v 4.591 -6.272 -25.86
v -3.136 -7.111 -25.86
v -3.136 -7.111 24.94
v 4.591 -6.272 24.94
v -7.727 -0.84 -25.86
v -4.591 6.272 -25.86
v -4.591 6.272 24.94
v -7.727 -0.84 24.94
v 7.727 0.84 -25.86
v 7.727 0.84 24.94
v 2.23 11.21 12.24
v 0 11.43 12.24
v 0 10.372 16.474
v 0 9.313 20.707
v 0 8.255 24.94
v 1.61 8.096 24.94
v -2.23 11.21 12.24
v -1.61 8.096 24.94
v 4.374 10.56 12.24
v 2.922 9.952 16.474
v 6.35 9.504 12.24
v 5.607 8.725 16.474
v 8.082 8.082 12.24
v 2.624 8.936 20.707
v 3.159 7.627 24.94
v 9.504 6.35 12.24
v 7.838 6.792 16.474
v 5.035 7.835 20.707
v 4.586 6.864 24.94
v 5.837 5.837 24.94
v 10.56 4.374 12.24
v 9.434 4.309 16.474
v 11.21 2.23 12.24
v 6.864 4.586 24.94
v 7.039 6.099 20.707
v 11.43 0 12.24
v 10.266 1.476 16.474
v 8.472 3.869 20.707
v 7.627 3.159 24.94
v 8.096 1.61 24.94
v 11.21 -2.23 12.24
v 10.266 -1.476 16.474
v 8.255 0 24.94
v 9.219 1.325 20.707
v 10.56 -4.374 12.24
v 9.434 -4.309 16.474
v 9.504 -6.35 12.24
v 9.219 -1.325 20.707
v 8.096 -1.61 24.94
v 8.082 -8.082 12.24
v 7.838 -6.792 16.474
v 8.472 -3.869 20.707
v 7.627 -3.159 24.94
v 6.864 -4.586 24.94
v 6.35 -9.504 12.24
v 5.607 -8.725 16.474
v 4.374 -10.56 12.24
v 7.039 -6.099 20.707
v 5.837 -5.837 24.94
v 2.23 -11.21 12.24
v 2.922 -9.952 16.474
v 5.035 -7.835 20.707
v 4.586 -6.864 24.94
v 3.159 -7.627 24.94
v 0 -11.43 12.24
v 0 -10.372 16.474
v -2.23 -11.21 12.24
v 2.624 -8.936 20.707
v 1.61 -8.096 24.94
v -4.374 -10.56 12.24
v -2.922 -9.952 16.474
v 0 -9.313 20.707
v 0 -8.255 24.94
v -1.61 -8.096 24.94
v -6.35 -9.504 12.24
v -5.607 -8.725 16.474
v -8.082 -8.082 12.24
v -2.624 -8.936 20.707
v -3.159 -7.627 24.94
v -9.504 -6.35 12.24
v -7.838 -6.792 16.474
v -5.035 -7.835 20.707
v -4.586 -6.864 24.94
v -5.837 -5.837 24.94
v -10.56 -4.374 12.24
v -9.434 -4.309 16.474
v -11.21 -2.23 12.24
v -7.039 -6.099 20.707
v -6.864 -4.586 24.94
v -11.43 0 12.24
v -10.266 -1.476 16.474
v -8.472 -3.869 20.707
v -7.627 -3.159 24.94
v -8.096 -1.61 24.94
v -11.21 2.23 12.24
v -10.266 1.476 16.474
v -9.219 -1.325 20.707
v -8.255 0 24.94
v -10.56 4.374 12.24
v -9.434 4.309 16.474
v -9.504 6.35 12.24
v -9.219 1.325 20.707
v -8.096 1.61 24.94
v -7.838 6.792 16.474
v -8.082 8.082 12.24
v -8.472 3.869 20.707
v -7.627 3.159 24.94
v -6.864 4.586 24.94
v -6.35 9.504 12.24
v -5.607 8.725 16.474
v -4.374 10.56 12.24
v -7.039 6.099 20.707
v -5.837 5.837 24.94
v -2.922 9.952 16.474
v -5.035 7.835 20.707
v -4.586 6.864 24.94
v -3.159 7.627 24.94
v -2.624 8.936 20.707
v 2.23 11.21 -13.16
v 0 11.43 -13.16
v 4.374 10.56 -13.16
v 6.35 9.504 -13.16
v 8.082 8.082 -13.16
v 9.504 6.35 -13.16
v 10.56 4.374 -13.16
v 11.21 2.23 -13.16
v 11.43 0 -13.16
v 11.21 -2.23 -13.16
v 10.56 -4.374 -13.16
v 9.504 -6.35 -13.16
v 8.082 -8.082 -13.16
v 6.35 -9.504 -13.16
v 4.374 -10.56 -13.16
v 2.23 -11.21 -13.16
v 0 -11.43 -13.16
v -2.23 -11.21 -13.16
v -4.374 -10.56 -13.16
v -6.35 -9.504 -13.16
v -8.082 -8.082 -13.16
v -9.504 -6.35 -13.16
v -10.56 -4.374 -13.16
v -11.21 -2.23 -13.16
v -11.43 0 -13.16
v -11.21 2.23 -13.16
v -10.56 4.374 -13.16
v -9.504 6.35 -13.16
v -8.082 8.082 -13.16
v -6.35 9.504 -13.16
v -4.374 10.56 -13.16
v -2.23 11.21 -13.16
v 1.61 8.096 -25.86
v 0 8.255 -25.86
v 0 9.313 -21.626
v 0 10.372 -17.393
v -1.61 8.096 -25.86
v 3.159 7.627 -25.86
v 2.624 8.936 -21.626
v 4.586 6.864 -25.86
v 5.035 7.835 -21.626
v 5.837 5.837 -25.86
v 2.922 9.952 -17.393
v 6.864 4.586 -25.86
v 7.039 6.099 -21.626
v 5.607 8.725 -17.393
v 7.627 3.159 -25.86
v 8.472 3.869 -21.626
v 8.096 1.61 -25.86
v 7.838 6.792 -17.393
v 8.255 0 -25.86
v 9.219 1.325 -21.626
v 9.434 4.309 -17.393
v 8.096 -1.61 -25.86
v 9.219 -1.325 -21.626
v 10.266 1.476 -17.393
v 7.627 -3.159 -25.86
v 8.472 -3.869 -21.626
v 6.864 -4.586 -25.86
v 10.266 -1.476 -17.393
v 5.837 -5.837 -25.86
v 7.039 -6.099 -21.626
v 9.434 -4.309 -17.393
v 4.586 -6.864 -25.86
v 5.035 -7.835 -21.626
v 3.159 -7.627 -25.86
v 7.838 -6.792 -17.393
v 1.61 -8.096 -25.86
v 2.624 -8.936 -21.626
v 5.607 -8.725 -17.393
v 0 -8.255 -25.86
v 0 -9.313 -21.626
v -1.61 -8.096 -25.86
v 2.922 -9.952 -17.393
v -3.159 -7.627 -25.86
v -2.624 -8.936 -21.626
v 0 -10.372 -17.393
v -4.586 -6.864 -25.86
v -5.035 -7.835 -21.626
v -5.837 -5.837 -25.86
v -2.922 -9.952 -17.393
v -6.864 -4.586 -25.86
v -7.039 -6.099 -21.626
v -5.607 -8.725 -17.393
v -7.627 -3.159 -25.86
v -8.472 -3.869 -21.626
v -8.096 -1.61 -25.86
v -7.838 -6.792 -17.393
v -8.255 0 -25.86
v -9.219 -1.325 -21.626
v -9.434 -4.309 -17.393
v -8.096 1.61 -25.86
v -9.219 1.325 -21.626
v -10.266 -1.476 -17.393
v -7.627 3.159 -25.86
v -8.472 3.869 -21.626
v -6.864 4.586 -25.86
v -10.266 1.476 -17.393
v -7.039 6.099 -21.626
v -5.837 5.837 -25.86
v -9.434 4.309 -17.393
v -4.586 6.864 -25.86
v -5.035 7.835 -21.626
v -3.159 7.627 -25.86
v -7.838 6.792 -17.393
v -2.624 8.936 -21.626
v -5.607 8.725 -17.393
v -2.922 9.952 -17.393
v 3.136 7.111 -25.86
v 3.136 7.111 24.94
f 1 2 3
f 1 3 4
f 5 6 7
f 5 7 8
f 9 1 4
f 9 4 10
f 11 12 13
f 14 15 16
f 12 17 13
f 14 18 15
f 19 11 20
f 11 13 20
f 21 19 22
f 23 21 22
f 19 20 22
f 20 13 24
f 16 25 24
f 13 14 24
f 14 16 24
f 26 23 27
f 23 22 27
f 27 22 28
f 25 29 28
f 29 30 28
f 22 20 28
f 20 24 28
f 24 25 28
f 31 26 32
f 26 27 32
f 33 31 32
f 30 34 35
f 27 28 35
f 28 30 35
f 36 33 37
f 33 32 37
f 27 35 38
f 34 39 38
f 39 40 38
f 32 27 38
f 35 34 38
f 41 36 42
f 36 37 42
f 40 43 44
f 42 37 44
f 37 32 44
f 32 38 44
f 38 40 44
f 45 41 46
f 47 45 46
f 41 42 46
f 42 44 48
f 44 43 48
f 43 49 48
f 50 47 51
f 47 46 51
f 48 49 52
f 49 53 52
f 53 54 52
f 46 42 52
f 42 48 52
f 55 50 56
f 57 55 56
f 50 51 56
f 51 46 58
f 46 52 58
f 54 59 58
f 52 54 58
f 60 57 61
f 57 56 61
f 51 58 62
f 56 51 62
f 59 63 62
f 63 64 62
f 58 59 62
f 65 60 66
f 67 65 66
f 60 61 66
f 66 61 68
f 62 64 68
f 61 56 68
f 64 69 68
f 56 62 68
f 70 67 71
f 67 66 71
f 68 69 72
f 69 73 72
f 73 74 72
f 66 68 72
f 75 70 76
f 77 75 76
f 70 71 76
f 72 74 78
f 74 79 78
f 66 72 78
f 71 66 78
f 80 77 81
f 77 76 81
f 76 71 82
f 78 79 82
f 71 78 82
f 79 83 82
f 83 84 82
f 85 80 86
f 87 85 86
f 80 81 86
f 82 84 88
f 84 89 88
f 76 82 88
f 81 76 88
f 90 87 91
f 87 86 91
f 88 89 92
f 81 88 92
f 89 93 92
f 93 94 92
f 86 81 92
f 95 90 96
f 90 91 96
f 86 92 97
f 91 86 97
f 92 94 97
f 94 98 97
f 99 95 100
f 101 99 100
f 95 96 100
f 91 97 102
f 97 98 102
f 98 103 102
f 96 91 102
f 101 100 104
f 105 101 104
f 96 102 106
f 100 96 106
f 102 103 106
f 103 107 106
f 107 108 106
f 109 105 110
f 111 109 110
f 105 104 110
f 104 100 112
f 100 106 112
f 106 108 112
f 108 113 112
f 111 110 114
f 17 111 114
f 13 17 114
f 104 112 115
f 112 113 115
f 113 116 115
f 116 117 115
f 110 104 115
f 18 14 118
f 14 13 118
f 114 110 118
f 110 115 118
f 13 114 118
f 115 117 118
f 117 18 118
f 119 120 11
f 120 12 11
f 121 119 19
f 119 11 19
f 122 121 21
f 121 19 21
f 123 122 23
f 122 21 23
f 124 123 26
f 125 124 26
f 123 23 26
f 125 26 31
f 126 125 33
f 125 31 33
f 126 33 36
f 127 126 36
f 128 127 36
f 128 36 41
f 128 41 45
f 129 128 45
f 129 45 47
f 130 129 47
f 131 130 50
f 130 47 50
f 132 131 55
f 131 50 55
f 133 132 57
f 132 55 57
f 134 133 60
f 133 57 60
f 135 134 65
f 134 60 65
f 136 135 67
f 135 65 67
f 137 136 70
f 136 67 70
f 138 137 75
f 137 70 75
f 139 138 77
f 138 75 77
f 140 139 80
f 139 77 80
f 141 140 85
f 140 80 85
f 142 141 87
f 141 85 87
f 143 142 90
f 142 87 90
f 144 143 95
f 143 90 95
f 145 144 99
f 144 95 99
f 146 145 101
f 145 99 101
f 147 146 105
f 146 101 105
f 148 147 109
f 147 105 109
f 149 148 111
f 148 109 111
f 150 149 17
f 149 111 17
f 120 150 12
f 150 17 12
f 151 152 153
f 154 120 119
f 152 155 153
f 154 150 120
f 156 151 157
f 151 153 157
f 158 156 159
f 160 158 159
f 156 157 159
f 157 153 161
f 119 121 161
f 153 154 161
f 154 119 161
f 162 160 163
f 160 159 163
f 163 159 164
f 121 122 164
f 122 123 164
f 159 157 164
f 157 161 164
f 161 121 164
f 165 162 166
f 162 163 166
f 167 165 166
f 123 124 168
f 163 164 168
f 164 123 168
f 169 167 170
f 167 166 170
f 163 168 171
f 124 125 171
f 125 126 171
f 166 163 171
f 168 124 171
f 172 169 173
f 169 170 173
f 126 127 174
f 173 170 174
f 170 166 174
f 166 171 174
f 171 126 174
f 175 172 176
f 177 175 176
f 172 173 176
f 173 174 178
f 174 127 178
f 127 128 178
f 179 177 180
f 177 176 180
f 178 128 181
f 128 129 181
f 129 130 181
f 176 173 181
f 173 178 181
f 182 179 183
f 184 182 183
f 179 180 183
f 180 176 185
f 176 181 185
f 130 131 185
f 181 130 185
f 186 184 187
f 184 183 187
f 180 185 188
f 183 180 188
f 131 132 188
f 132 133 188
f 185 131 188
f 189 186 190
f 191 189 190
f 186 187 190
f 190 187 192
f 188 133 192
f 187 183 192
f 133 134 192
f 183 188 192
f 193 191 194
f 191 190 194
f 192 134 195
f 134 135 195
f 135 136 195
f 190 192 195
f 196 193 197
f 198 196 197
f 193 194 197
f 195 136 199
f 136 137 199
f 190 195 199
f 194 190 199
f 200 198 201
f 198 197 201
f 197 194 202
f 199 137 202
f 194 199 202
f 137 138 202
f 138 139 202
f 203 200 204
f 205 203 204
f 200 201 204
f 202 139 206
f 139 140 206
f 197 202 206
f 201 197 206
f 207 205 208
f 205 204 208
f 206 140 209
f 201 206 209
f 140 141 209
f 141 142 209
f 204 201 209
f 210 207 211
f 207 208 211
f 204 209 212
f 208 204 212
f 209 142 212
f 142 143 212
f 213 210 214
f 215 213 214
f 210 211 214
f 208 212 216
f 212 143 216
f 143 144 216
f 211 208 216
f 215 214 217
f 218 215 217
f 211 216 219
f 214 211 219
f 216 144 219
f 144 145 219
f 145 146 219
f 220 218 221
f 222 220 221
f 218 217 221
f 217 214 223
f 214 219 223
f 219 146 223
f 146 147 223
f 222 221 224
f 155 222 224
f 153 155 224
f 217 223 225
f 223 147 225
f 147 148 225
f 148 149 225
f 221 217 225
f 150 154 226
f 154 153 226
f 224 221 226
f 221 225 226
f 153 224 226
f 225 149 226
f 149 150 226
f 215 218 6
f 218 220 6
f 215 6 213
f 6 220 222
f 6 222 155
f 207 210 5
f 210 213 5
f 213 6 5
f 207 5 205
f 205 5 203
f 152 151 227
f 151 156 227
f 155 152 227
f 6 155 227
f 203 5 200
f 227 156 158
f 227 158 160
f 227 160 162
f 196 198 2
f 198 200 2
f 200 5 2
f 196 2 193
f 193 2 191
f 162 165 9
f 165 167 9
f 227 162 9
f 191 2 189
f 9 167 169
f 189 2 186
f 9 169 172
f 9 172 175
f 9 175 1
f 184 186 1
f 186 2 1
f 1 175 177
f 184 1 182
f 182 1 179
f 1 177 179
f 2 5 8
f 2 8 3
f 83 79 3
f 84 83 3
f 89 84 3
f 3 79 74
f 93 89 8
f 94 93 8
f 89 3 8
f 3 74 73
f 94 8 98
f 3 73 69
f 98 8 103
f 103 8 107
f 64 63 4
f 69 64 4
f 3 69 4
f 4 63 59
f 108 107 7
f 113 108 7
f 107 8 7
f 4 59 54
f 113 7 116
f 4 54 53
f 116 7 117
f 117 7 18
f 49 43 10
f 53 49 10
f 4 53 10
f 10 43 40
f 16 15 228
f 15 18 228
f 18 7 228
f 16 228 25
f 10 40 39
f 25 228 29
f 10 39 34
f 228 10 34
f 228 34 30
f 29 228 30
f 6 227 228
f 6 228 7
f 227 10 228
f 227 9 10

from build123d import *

# Parameters (mm, degrees)
F3_DEPTH      = 38.1
F3_DEPTH_BACK = 38.1


with BuildPart() as f2:
    # F1 (on Right) → F2 (revolve)
    with BuildSketch(Plane.YZ):
        Polygon((8.255, 24.9404996053), (6.731, 24.9404996053), (6.731, -25.8595003947), (8.255, -25.8595003947), (11.43, -13.1595003947), (11.43, 12.2404996053), align=None)
    revolve(axis=Axis((0, 0, -0.0453809016), (0, 0, -1)))

    # F0 (on Top) → F3 (cut, two sides)
    with BuildSketch(Plane.XY) as f3_sk:
        Polygon((7.7267937867, 0.8397256168), (3.136173177, 7.1114625174), (-4.5906206097, 6.2717369007), (-7.7267937867, -0.8397256168), (-3.136173177, -7.1114625174), (4.5906206097, -6.2717369007), align=None)
    extrude(amount=-F3_DEPTH, mode=Mode.SUBTRACT)
    extrude(f3_sk.sketch, amount=F3_DEPTH_BACK, mode=Mode.SUBTRACT)


solid = f2.part
